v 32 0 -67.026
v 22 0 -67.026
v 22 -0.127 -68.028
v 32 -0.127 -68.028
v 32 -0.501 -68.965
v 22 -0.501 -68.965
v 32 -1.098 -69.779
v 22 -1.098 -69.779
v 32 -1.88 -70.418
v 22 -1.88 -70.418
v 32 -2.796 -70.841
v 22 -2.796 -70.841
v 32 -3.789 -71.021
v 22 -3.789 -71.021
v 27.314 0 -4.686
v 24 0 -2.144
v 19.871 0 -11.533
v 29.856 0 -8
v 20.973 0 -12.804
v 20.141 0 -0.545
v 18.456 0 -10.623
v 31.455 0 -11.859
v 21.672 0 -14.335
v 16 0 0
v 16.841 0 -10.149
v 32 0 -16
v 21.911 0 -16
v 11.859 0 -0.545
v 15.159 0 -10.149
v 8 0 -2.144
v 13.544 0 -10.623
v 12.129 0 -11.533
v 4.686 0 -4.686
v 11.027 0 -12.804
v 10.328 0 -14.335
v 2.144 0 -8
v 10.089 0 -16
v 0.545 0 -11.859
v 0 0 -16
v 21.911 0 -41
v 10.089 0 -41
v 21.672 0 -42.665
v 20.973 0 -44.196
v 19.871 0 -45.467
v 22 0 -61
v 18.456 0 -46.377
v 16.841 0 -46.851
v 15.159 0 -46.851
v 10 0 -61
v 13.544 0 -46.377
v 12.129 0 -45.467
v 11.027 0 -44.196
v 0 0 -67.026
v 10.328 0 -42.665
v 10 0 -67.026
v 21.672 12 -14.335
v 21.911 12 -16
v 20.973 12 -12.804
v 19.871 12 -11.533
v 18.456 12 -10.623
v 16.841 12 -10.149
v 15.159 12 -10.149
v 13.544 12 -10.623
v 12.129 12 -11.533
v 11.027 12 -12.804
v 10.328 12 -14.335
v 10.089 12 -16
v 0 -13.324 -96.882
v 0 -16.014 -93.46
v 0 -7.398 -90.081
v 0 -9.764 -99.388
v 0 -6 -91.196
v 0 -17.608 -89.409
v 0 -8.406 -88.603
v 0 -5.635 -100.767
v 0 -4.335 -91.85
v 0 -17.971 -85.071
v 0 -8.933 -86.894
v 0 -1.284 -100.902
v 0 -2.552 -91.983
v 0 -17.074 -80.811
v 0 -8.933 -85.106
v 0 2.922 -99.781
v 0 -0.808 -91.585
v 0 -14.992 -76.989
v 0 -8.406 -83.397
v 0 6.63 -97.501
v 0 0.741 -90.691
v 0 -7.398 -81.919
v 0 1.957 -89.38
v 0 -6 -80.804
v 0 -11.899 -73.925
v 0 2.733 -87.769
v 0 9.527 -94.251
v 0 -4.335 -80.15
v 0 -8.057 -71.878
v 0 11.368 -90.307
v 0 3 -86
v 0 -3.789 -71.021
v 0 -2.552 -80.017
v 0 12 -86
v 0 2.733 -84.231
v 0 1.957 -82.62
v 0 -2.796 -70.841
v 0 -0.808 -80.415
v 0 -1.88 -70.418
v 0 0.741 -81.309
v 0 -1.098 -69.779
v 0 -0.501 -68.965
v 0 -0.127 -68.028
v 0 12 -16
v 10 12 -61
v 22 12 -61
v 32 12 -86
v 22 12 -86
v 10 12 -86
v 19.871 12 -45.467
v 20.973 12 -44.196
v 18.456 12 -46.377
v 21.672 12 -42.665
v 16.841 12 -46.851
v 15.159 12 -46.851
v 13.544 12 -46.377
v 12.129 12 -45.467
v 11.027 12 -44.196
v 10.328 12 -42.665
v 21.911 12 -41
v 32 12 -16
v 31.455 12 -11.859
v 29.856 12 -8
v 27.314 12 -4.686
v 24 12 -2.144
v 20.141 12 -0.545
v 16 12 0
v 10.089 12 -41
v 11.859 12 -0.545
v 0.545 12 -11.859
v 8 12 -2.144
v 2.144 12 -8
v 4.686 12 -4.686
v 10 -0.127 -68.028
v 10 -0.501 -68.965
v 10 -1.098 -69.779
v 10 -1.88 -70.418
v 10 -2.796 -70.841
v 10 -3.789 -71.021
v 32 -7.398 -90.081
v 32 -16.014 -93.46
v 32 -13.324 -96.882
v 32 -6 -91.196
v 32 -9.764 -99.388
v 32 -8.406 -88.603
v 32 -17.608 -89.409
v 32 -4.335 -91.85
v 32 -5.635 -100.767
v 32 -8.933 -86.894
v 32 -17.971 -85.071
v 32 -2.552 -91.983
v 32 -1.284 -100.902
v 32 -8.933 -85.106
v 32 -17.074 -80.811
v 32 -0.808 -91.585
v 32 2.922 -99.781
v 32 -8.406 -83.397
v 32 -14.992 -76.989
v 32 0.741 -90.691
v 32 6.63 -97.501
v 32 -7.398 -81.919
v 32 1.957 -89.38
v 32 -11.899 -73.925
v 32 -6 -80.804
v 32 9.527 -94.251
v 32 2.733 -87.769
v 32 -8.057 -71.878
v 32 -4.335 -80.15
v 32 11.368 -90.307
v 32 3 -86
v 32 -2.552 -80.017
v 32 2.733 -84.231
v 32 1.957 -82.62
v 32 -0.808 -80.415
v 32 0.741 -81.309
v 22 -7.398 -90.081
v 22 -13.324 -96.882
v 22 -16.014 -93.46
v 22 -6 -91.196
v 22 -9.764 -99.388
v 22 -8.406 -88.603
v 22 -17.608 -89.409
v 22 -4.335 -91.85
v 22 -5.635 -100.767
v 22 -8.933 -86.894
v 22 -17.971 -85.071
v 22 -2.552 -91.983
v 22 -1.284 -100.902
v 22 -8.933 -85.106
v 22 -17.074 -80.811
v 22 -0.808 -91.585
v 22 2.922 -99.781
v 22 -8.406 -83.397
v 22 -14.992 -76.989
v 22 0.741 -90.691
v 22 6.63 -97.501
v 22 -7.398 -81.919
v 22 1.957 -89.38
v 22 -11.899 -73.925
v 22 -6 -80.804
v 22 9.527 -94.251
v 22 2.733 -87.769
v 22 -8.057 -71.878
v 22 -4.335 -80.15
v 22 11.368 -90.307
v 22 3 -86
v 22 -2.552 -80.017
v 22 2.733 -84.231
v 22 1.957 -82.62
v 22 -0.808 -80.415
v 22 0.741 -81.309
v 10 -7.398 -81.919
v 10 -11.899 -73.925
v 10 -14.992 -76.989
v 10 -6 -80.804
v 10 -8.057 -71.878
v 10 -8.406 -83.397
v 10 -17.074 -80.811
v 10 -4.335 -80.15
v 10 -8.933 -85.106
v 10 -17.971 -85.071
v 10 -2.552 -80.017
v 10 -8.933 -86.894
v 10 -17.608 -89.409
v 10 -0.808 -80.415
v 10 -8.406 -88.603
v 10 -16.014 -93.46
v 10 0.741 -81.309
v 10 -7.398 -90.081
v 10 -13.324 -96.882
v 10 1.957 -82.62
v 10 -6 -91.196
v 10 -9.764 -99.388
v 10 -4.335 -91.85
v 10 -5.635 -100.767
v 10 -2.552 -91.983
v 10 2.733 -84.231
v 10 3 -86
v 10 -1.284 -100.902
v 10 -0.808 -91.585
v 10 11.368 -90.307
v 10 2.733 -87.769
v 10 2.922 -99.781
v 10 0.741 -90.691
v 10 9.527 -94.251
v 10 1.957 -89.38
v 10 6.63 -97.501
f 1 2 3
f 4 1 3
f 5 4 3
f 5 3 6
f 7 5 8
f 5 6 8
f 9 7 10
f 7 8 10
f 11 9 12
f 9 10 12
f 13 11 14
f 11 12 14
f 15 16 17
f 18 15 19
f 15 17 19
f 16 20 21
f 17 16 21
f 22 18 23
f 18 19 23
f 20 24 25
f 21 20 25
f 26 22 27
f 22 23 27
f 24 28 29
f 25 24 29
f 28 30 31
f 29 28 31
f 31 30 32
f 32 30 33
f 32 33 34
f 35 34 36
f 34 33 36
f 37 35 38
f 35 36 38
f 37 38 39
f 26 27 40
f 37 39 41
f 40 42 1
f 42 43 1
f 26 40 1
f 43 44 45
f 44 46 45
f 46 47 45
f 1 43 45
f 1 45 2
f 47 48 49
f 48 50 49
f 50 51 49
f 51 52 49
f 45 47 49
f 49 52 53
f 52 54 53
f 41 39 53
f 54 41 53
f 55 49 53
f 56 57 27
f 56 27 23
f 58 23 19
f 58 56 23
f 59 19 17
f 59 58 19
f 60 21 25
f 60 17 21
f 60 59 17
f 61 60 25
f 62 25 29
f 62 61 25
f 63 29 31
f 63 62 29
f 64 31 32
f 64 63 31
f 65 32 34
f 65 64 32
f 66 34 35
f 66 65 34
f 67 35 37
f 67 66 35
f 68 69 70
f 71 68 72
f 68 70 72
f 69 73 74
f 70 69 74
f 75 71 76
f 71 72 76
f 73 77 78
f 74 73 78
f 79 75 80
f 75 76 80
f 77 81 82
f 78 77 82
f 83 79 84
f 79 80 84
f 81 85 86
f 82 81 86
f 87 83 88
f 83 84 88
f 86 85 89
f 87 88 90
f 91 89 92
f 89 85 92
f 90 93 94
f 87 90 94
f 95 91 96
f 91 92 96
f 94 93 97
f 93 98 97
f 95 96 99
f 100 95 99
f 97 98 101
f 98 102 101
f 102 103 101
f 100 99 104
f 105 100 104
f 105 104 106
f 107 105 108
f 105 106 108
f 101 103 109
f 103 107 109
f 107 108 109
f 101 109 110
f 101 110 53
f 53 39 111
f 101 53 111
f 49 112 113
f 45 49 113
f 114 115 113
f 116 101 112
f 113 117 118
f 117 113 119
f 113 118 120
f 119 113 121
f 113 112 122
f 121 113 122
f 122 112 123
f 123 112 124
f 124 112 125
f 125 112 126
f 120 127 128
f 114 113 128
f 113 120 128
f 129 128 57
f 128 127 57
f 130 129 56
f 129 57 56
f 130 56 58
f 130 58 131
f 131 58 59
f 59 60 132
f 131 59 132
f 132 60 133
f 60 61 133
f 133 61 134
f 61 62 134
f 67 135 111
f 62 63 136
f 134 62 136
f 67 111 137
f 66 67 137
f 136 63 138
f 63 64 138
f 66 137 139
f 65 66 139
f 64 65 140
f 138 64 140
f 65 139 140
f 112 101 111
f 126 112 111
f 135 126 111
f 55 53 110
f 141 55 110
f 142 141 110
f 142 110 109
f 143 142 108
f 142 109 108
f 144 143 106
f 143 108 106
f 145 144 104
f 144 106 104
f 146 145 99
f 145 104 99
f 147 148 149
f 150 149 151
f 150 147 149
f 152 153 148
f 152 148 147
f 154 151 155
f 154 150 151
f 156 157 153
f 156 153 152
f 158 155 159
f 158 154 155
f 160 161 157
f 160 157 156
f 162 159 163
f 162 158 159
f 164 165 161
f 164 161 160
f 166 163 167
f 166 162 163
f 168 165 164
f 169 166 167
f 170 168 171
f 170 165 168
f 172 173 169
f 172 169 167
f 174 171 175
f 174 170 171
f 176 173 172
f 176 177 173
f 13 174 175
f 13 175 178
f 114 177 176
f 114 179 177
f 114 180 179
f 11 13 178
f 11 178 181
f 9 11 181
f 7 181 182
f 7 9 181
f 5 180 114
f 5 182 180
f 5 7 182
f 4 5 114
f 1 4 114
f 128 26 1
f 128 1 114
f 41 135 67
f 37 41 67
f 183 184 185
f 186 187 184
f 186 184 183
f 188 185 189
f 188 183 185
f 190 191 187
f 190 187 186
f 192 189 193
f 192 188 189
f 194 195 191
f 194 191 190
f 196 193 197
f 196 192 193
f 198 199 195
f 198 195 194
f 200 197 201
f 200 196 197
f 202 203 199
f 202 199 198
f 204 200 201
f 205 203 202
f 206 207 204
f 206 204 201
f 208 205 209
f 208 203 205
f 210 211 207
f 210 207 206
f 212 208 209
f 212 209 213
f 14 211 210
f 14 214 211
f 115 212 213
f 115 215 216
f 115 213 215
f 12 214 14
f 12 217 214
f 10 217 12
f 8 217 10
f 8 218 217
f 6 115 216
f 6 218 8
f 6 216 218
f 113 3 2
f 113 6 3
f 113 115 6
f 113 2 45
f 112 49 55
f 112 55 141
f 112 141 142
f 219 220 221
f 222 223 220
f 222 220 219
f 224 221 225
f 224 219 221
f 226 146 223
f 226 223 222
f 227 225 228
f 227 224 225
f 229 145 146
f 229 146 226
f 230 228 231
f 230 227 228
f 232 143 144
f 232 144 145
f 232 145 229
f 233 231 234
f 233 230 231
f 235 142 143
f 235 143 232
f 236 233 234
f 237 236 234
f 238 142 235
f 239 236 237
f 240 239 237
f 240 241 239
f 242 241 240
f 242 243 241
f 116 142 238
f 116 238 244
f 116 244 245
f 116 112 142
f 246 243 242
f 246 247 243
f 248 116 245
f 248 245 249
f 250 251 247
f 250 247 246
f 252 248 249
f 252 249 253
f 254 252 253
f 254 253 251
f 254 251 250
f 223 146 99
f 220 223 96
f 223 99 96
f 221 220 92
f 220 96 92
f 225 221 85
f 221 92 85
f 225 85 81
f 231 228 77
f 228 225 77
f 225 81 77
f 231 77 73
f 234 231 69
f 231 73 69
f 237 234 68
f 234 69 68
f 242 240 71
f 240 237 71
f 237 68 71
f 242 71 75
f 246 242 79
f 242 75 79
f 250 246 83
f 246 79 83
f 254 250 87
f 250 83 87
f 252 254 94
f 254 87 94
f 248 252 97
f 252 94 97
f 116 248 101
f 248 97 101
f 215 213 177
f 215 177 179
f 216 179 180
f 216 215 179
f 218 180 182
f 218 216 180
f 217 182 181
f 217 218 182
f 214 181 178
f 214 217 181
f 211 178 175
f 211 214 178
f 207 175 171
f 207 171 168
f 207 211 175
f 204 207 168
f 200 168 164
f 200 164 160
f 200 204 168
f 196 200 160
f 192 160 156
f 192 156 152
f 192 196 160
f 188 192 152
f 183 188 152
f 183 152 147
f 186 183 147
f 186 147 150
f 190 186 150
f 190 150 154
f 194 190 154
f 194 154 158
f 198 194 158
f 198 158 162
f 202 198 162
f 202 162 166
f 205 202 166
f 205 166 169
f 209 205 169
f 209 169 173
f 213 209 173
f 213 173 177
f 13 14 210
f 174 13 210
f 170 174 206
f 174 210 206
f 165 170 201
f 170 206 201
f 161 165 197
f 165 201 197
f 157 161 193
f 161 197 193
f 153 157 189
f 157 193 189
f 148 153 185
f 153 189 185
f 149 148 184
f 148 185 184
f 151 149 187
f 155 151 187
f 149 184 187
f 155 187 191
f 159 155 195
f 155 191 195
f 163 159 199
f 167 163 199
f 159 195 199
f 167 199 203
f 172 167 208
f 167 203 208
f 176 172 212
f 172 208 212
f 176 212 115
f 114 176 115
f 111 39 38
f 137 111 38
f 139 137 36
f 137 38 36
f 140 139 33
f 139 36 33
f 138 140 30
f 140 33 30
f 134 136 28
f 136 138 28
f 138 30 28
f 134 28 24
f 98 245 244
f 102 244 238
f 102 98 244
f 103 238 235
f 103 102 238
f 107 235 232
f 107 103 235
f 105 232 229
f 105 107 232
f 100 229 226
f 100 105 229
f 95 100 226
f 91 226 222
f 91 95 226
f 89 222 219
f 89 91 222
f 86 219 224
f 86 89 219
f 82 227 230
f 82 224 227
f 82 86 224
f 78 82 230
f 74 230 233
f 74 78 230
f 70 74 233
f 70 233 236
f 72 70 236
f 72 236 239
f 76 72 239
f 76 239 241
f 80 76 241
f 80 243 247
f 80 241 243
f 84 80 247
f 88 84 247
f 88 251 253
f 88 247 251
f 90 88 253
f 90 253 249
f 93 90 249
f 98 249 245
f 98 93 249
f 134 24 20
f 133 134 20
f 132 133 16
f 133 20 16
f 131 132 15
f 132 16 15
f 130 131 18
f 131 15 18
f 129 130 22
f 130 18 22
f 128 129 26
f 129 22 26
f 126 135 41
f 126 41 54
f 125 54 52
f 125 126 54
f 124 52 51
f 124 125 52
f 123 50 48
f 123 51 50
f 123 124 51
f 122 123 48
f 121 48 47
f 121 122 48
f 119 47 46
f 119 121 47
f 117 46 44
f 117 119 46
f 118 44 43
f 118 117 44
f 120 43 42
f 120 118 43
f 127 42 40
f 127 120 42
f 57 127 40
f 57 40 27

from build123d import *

# Parameters (mm, degrees)
F0_R     = 6
F1_DEPTH = 32
F2_W     = 12
F2_H     = 6.026334
F2_W_2   = 11.82259
F2_H_2   = 25
F2_H_3   = 33.973666
F3_DEPTH = 20


with BuildPart() as f1:
    # F0 (on Right) → F1 (new body)
    with BuildSketch(Plane.YZ):
        with BuildLine():
            Line((12, 0), (0, 0))
            Line((0, 0), (0, -67.026334))
            ThreePointArc((0, -67.026334), (-1.098095, -69.779323), (-3.789474, -71.02079))
            ThreePointArc((-3.789474, -71.02079), (-13.323708, -96.882144), (12, -86))
            Line((12, -86), (12, 0))
        make_face()
        with Locations((-3, -86)):
            Circle(F0_R, mode=Mode.SUBTRACT)
    extrude(amount=F1_DEPTH)

    # F2 (on face) → F3 (cut, symmetric)
    with BuildSketch(Plane.XZ):
        with Locations((16, -64.013167)):
            Rectangle(F2_W, F2_H)
        with BuildLine():
            ThreePointArc((10.088705, -41), (16, -46.911295), (21.911295, -41))
            Line((21.911295, -41), (10.088705, -41))
        make_face()
        with Locations((16, -28.5)):
            Rectangle(F2_W_2, F2_H_2)
        with BuildLine():
            Line((10.088705, -16), (21.911295, -16))
            ThreePointArc((21.911295, -16), (16, -10.088705), (10.088705, -16))
        make_face()
        with BuildLine():
            ThreePointArc((16, 0), (27.313708, -4.686292), (32, -16))
            Line((32, -16), (32, 0))
            Line((32, 0), (16, 0))
        make_face()
        with BuildLine():
            Line((0, 0), (0, -16))
            ThreePointArc((0, -16), (4.686292, -4.686292), (16, 0))
            Line((16, 0), (0, 0))
        make_face()
        with Locations((16, -84.013167)):
            Rectangle(F2_W, F2_H_3)
    extrude(amount=F3_DEPTH, both=True, mode=Mode.SUBTRACT)


solid = f1.part
